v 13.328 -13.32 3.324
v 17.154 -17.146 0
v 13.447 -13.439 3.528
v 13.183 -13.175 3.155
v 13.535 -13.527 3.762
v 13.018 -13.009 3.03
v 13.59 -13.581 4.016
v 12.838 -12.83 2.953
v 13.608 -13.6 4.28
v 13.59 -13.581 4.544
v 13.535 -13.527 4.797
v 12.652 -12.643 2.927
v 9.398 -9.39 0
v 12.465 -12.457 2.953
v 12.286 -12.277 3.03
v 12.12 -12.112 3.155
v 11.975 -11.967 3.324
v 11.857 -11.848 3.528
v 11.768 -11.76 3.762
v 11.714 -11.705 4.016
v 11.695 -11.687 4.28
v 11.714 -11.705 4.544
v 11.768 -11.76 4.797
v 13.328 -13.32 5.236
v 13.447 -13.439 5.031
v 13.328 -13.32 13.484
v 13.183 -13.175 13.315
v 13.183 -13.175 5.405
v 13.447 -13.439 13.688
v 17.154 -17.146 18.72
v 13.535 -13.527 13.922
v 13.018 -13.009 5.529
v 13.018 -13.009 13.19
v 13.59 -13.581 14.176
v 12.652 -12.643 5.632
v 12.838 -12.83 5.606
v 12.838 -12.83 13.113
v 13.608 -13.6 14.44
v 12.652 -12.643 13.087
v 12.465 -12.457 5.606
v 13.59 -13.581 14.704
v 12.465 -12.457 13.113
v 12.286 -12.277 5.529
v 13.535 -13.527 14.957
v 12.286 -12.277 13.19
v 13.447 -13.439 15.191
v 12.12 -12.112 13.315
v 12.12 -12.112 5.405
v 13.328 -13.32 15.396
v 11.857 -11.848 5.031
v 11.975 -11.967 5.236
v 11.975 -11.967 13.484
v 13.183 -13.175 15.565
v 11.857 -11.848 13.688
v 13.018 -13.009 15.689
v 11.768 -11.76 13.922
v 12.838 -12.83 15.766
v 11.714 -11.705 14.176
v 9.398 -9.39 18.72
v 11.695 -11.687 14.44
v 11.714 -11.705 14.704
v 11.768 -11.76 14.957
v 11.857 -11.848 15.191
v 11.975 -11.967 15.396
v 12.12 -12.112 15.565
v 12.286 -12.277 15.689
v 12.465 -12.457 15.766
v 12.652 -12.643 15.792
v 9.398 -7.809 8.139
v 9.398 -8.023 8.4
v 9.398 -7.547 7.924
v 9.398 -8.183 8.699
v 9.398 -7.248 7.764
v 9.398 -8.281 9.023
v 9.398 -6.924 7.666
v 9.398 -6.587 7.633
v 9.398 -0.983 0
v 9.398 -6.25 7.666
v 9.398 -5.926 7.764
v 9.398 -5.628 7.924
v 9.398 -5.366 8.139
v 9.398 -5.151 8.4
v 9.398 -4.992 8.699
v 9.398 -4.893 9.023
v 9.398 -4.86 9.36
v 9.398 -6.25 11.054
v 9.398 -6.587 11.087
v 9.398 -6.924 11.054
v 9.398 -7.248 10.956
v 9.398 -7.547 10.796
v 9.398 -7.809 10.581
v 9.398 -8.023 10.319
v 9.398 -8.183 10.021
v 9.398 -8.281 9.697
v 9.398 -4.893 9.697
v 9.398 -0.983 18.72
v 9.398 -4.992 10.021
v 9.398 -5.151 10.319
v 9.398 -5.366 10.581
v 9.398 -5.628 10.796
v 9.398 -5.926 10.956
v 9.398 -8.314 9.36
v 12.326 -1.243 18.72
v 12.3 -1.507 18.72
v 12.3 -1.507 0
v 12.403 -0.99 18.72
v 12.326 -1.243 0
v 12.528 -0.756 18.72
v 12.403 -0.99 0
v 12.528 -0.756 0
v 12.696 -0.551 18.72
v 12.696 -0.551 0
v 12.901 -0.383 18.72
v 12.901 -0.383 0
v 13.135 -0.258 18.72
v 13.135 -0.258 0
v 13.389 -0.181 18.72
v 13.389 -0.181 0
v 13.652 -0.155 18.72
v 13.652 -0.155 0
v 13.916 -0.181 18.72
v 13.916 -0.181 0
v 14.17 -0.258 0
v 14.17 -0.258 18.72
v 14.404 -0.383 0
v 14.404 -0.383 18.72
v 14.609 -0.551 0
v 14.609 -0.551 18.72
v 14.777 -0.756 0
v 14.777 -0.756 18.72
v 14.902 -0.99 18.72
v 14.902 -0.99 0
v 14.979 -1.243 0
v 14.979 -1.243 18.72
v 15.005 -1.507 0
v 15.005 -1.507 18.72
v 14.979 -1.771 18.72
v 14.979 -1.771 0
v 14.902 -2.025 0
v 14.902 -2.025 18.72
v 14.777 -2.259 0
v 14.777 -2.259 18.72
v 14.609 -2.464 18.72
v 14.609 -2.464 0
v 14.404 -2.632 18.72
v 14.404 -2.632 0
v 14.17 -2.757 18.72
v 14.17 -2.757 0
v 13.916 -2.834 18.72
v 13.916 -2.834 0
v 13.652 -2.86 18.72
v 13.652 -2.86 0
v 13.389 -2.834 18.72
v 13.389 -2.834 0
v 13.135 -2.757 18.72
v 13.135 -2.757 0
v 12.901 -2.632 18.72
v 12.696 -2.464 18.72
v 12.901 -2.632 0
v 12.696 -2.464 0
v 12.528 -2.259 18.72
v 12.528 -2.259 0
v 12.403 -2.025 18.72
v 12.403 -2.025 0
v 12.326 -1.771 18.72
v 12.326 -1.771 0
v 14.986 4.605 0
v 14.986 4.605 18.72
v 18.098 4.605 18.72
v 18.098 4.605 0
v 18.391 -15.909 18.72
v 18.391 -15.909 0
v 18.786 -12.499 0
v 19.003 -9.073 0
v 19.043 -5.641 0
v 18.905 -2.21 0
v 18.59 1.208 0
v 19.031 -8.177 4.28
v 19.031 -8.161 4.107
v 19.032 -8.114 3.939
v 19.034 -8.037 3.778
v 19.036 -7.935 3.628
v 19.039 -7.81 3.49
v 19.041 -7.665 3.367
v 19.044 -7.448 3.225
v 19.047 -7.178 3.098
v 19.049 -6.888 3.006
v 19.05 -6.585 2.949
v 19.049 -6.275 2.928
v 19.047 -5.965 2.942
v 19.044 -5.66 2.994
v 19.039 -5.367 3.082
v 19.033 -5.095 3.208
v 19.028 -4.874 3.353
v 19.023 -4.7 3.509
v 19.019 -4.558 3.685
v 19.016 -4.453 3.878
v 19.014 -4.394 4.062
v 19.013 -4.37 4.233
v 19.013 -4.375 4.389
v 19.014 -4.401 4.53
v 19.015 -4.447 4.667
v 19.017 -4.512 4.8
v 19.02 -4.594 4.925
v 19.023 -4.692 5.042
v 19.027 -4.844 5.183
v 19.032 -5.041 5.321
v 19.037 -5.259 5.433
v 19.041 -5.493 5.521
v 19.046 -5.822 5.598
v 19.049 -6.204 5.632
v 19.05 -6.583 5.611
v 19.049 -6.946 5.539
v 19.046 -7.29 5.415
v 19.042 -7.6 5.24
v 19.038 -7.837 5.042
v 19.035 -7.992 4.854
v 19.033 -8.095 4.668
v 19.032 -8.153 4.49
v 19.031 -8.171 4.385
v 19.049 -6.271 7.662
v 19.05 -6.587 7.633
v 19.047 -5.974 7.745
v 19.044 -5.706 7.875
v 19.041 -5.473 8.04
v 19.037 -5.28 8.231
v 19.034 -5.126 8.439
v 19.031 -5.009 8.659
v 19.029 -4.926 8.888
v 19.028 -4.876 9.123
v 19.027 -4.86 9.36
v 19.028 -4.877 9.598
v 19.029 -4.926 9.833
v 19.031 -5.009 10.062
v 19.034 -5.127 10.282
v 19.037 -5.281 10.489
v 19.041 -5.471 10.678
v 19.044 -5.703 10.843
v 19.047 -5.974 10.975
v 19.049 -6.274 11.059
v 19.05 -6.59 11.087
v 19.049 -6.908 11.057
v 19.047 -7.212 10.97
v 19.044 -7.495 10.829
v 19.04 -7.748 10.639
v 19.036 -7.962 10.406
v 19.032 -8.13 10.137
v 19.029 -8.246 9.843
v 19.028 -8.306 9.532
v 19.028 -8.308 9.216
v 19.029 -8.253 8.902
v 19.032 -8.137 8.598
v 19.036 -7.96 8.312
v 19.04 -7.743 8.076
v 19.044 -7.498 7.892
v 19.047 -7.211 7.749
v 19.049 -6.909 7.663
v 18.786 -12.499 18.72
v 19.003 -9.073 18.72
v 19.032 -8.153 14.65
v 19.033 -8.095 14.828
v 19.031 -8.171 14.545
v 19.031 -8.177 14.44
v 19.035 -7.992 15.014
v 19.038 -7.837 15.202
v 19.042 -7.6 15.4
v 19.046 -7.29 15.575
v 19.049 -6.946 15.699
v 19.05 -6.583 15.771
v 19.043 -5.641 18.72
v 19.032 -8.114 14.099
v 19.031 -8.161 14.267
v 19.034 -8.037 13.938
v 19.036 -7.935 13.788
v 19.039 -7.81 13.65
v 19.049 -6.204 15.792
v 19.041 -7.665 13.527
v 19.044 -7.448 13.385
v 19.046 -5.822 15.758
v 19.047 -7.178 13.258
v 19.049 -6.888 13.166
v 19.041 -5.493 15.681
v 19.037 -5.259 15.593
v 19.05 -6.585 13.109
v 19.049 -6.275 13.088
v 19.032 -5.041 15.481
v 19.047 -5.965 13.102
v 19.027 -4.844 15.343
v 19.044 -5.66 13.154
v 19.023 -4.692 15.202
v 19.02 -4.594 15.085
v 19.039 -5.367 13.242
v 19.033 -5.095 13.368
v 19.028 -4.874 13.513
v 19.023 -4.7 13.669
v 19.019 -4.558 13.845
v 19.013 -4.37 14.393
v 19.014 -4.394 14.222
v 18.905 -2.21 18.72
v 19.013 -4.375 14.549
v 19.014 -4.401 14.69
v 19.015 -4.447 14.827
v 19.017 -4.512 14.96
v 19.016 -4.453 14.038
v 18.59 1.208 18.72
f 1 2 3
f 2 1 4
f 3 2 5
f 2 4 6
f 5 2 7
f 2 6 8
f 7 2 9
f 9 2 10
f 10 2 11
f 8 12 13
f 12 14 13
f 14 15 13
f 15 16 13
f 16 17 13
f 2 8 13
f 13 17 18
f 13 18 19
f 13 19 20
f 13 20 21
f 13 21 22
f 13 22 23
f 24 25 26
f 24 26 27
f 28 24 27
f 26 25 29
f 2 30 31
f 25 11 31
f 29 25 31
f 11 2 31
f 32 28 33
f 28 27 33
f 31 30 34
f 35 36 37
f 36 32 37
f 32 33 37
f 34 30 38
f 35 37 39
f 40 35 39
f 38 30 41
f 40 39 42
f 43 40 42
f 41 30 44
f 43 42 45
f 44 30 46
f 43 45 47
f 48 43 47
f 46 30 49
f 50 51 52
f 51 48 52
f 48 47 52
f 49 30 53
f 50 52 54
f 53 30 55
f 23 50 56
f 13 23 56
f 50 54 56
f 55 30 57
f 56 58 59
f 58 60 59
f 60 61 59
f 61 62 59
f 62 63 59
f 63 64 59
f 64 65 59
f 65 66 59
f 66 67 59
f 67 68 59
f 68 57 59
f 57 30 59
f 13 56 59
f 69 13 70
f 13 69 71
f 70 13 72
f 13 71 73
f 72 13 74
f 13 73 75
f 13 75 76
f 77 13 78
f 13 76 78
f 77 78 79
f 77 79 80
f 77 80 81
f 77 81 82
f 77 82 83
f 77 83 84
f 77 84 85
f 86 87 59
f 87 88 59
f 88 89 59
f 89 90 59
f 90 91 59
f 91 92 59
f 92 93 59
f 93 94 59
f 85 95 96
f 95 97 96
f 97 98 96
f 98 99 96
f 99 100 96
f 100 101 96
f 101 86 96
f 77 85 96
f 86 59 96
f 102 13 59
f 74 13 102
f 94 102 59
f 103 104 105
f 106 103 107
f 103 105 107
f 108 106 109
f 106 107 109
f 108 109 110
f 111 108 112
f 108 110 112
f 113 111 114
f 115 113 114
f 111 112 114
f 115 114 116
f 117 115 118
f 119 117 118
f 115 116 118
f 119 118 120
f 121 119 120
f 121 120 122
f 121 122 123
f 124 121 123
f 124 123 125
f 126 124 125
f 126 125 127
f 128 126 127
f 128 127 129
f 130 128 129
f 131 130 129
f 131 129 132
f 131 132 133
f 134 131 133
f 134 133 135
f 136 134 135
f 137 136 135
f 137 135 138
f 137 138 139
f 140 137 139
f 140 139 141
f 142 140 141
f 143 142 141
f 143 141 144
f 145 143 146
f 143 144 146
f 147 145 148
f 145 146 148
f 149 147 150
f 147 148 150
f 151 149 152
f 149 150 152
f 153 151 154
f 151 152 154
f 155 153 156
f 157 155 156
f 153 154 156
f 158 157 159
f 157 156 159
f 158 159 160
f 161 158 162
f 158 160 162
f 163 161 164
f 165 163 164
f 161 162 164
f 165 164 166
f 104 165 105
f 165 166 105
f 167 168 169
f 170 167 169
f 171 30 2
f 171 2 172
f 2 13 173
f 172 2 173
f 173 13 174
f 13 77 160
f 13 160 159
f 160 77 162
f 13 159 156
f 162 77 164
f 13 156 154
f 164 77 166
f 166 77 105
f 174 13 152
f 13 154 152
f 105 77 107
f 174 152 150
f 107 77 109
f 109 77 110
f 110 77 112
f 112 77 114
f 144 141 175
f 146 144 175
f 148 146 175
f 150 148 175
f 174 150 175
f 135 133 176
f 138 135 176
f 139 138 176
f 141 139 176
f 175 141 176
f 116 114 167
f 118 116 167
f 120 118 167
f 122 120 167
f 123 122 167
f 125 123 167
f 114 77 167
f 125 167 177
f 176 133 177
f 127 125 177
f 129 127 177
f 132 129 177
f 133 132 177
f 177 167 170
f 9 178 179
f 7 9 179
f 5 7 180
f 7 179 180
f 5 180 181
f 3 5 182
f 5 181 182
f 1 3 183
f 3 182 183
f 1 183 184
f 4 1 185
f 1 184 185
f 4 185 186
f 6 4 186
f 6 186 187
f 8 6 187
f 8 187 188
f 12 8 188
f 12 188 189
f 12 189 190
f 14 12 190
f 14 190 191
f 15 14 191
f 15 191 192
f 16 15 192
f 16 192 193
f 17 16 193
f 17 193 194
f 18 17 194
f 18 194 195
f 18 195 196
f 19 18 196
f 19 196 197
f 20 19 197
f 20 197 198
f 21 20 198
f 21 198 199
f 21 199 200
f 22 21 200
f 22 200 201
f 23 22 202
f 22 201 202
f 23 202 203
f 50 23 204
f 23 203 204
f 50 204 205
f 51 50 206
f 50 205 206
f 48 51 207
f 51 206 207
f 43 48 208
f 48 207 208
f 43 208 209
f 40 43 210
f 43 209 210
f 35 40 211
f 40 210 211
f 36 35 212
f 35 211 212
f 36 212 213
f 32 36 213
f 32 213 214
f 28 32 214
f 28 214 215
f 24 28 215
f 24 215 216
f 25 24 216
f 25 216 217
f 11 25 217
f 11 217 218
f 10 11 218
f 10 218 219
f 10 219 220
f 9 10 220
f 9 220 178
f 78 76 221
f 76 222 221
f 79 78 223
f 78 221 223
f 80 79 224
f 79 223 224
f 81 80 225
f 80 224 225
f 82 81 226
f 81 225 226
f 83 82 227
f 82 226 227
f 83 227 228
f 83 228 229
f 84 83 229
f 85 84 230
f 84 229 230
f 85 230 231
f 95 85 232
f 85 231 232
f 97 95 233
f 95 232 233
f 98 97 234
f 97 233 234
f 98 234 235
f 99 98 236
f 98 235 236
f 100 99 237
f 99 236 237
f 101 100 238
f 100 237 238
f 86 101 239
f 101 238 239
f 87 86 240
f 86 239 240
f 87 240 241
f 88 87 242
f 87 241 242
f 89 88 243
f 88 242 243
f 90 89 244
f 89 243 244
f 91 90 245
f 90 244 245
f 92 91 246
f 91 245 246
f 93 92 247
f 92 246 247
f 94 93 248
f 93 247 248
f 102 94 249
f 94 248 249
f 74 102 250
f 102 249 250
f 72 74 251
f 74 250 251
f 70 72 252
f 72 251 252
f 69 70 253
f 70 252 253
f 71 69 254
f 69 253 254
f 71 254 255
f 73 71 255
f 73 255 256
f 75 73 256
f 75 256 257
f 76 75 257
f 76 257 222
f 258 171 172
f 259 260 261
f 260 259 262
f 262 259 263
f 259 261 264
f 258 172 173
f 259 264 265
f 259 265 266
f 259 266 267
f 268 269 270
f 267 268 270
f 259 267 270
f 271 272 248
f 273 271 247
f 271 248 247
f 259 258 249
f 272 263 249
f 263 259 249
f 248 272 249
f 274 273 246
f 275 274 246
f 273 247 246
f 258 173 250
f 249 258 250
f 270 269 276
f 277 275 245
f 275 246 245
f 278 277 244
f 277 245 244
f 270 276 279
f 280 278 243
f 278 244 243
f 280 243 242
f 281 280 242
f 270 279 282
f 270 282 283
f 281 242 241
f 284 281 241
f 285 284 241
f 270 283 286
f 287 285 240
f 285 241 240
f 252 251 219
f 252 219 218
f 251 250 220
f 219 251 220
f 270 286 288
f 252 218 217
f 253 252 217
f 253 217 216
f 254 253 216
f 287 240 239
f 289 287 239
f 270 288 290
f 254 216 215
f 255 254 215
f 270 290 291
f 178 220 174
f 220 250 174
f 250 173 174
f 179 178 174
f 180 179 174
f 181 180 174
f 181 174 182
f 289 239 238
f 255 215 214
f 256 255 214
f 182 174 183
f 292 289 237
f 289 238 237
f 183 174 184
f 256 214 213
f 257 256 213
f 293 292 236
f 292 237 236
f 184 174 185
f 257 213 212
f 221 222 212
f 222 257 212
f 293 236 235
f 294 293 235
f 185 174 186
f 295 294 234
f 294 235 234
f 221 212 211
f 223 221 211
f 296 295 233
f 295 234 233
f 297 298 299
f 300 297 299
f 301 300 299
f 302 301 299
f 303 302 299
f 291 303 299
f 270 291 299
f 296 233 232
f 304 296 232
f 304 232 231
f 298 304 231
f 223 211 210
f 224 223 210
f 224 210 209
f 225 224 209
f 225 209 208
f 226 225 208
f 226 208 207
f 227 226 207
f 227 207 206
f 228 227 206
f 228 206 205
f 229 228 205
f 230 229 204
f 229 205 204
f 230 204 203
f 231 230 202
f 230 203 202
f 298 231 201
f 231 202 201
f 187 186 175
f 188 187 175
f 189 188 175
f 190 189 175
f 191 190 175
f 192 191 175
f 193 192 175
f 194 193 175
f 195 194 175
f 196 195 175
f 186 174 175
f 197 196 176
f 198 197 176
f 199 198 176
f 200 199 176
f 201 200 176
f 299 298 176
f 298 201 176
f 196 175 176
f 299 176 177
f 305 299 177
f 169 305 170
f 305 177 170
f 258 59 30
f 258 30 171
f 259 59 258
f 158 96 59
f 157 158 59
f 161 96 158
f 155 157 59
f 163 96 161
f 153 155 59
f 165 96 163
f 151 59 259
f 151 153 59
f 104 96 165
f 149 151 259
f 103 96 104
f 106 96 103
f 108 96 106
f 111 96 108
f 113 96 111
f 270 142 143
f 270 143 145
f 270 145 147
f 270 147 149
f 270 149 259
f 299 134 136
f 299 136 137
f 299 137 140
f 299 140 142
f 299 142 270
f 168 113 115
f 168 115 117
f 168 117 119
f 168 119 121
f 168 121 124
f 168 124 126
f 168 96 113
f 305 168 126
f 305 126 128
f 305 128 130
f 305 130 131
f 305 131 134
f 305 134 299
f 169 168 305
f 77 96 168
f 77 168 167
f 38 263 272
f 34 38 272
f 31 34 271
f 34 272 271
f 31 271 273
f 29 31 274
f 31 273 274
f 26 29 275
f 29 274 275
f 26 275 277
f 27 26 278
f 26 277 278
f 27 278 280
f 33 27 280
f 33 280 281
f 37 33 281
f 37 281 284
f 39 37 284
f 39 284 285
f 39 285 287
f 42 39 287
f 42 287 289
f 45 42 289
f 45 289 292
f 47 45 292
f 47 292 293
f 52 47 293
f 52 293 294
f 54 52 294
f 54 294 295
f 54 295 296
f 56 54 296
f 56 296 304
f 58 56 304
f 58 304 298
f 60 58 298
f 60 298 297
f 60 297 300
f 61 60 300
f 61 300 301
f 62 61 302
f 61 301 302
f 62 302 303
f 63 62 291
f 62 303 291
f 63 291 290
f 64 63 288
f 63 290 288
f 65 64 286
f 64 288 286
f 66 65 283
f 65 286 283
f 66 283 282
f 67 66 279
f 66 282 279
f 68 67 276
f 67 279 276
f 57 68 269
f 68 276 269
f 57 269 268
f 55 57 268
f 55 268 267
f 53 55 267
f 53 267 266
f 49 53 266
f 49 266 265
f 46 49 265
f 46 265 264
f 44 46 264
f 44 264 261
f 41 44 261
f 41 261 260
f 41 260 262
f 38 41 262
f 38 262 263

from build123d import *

# Parameters (mm, degrees)
EXTRUDE1_DEPTH            = 18.7198
SKETCH13_W                = 30.336118919
SKETCH13_H                = 26.43936277
EXTRUDE2_DEPTH            = 40.057833358
F_6_32_TAPPED_HOLE2_D     = 2.7051
EXTRUDE3_DEPTH            = 40.057833358
F_6_32_TAPPED_HOLE1_D     = 2.7051
F_8_32_TAPPED_HOLE5_D     = 3.4544
F_8_32_TAPPED_HOLE5_DEPTH = 19.05
F_8_32_TAPPED_HOLE5_TIP   = 1.037806461
SKETCH22_W                = 9.398
SKETCH22_H                = 21.690053411
EXTRUDE4_DEPTH            = 33.232321948
CHAMFER1_SIZE             = 5.588
CUT_EXTRUDE1_DEPTH        = 33.232321948


with BuildPart() as part:
    # Sketch1 → Extrude1 (new body)
    with BuildSketch(Plane.XY):
        with BuildLine():
            Line((0, 0), (0, -13.17458008))
            Line((0, -13.17458008), (15.324208221, -28.498788301))
            ThreePointArc((15.324208221, -28.498788301), (19.05, -6.58729004), (15.324208221, 15.324208221))
            Line((15.324208221, 15.324208221), (0, 15.324208221))
            Line((0, 15.324208221), (0, 0))
        make_face()
    extrude(amount=EXTRUDE1_DEPTH)

    # Sketch13 → Extrude2 (cut, through all)
    with BuildSketch(Plane.XY.offset(18.7198)):
        with Locations((15.16805946, 17.825101305)):
            Rectangle(SKETCH13_W, SKETCH13_H)
    extrude(amount=-EXTRUDE2_DEPTH, mode=Mode.SUBTRACT)

    # #6-32 Tapped Hole2 (through all)
    with Locations(Plane.XY.offset(18.7198)):
        with Locations((13.6525, -1.50729004)):
            Hole(F_6_32_TAPPED_HOLE2_D / 2)

    # Sketch14 → Extrude3 (cut, through all)
    with BuildSketch(Plane.XY.offset(18.7198)):
        Polygon((0.684709755, -13.859289835), (7.276217748, -7.267781842), (18.052525094, -18.044089188), (21.915716214, -21.907280308), (15.324208221, -28.498788301), align=None)
    extrude(amount=-EXTRUDE3_DEPTH, mode=Mode.SUBTRACT)

    # #6-32 Tapped Hole1 (through all)
    with Locations(Plane(origin=(12.651735758, -12.643299852, 14.4399), x_dir=(-0.707106781187, 0.707106781187, 0), z_dir=(-0.707106781187, -0.707106781187, 0))):
        with Locations((0, 0), (0, 10.16)):
            Hole(F_6_32_TAPPED_HOLE1_D / 2)

    # #8-32 Tapped Hole5
    with Locations(Plane.ZY):
        with Locations((9.3599, -6.58729004)):
            Hole(F_8_32_TAPPED_HOLE5_D / 2, depth=F_8_32_TAPPED_HOLE5_DEPTH)
            with Locations((0, 0, -(F_8_32_TAPPED_HOLE5_DEPTH + F_8_32_TAPPED_HOLE5_TIP / 2))):  # 118° drill point
                Cone(0, F_8_32_TAPPED_HOLE5_D / 2, F_8_32_TAPPED_HOLE5_TIP, mode=Mode.SUBTRACT)

    # Sketch22 → Extrude4 (cut, through all)
    with BuildSketch(Plane.XY.offset(18.7198)):
        with Locations((4.699, -6.239606786)):
            Rectangle(SKETCH22_W, SKETCH22_H)
    extrude(amount=-EXTRUDE4_DEPTH, mode=Mode.SUBTRACT)

    # Chamfer1
    chamfer1_edges = [part.edges().sort_by_distance(p)[0] for p in [
        (9.398, 4.60541992, 9.3599),
    ]]
    chamfer(chamfer1_edges, length=CHAMFER1_SIZE)

    # Sketch27 → Cut-Extrude1 (cut, through all)
    with BuildSketch(Plane.XY.offset(18.7198)):
        Polygon((17.154499481, -17.146063576), (21.888027801, -12.412535256), (22.786053413, -13.310560868), (18.052525094, -18.044089188), align=None)
    extrude(amount=-CUT_EXTRUDE1_DEPTH, mode=Mode.SUBTRACT)


solid = part.part
